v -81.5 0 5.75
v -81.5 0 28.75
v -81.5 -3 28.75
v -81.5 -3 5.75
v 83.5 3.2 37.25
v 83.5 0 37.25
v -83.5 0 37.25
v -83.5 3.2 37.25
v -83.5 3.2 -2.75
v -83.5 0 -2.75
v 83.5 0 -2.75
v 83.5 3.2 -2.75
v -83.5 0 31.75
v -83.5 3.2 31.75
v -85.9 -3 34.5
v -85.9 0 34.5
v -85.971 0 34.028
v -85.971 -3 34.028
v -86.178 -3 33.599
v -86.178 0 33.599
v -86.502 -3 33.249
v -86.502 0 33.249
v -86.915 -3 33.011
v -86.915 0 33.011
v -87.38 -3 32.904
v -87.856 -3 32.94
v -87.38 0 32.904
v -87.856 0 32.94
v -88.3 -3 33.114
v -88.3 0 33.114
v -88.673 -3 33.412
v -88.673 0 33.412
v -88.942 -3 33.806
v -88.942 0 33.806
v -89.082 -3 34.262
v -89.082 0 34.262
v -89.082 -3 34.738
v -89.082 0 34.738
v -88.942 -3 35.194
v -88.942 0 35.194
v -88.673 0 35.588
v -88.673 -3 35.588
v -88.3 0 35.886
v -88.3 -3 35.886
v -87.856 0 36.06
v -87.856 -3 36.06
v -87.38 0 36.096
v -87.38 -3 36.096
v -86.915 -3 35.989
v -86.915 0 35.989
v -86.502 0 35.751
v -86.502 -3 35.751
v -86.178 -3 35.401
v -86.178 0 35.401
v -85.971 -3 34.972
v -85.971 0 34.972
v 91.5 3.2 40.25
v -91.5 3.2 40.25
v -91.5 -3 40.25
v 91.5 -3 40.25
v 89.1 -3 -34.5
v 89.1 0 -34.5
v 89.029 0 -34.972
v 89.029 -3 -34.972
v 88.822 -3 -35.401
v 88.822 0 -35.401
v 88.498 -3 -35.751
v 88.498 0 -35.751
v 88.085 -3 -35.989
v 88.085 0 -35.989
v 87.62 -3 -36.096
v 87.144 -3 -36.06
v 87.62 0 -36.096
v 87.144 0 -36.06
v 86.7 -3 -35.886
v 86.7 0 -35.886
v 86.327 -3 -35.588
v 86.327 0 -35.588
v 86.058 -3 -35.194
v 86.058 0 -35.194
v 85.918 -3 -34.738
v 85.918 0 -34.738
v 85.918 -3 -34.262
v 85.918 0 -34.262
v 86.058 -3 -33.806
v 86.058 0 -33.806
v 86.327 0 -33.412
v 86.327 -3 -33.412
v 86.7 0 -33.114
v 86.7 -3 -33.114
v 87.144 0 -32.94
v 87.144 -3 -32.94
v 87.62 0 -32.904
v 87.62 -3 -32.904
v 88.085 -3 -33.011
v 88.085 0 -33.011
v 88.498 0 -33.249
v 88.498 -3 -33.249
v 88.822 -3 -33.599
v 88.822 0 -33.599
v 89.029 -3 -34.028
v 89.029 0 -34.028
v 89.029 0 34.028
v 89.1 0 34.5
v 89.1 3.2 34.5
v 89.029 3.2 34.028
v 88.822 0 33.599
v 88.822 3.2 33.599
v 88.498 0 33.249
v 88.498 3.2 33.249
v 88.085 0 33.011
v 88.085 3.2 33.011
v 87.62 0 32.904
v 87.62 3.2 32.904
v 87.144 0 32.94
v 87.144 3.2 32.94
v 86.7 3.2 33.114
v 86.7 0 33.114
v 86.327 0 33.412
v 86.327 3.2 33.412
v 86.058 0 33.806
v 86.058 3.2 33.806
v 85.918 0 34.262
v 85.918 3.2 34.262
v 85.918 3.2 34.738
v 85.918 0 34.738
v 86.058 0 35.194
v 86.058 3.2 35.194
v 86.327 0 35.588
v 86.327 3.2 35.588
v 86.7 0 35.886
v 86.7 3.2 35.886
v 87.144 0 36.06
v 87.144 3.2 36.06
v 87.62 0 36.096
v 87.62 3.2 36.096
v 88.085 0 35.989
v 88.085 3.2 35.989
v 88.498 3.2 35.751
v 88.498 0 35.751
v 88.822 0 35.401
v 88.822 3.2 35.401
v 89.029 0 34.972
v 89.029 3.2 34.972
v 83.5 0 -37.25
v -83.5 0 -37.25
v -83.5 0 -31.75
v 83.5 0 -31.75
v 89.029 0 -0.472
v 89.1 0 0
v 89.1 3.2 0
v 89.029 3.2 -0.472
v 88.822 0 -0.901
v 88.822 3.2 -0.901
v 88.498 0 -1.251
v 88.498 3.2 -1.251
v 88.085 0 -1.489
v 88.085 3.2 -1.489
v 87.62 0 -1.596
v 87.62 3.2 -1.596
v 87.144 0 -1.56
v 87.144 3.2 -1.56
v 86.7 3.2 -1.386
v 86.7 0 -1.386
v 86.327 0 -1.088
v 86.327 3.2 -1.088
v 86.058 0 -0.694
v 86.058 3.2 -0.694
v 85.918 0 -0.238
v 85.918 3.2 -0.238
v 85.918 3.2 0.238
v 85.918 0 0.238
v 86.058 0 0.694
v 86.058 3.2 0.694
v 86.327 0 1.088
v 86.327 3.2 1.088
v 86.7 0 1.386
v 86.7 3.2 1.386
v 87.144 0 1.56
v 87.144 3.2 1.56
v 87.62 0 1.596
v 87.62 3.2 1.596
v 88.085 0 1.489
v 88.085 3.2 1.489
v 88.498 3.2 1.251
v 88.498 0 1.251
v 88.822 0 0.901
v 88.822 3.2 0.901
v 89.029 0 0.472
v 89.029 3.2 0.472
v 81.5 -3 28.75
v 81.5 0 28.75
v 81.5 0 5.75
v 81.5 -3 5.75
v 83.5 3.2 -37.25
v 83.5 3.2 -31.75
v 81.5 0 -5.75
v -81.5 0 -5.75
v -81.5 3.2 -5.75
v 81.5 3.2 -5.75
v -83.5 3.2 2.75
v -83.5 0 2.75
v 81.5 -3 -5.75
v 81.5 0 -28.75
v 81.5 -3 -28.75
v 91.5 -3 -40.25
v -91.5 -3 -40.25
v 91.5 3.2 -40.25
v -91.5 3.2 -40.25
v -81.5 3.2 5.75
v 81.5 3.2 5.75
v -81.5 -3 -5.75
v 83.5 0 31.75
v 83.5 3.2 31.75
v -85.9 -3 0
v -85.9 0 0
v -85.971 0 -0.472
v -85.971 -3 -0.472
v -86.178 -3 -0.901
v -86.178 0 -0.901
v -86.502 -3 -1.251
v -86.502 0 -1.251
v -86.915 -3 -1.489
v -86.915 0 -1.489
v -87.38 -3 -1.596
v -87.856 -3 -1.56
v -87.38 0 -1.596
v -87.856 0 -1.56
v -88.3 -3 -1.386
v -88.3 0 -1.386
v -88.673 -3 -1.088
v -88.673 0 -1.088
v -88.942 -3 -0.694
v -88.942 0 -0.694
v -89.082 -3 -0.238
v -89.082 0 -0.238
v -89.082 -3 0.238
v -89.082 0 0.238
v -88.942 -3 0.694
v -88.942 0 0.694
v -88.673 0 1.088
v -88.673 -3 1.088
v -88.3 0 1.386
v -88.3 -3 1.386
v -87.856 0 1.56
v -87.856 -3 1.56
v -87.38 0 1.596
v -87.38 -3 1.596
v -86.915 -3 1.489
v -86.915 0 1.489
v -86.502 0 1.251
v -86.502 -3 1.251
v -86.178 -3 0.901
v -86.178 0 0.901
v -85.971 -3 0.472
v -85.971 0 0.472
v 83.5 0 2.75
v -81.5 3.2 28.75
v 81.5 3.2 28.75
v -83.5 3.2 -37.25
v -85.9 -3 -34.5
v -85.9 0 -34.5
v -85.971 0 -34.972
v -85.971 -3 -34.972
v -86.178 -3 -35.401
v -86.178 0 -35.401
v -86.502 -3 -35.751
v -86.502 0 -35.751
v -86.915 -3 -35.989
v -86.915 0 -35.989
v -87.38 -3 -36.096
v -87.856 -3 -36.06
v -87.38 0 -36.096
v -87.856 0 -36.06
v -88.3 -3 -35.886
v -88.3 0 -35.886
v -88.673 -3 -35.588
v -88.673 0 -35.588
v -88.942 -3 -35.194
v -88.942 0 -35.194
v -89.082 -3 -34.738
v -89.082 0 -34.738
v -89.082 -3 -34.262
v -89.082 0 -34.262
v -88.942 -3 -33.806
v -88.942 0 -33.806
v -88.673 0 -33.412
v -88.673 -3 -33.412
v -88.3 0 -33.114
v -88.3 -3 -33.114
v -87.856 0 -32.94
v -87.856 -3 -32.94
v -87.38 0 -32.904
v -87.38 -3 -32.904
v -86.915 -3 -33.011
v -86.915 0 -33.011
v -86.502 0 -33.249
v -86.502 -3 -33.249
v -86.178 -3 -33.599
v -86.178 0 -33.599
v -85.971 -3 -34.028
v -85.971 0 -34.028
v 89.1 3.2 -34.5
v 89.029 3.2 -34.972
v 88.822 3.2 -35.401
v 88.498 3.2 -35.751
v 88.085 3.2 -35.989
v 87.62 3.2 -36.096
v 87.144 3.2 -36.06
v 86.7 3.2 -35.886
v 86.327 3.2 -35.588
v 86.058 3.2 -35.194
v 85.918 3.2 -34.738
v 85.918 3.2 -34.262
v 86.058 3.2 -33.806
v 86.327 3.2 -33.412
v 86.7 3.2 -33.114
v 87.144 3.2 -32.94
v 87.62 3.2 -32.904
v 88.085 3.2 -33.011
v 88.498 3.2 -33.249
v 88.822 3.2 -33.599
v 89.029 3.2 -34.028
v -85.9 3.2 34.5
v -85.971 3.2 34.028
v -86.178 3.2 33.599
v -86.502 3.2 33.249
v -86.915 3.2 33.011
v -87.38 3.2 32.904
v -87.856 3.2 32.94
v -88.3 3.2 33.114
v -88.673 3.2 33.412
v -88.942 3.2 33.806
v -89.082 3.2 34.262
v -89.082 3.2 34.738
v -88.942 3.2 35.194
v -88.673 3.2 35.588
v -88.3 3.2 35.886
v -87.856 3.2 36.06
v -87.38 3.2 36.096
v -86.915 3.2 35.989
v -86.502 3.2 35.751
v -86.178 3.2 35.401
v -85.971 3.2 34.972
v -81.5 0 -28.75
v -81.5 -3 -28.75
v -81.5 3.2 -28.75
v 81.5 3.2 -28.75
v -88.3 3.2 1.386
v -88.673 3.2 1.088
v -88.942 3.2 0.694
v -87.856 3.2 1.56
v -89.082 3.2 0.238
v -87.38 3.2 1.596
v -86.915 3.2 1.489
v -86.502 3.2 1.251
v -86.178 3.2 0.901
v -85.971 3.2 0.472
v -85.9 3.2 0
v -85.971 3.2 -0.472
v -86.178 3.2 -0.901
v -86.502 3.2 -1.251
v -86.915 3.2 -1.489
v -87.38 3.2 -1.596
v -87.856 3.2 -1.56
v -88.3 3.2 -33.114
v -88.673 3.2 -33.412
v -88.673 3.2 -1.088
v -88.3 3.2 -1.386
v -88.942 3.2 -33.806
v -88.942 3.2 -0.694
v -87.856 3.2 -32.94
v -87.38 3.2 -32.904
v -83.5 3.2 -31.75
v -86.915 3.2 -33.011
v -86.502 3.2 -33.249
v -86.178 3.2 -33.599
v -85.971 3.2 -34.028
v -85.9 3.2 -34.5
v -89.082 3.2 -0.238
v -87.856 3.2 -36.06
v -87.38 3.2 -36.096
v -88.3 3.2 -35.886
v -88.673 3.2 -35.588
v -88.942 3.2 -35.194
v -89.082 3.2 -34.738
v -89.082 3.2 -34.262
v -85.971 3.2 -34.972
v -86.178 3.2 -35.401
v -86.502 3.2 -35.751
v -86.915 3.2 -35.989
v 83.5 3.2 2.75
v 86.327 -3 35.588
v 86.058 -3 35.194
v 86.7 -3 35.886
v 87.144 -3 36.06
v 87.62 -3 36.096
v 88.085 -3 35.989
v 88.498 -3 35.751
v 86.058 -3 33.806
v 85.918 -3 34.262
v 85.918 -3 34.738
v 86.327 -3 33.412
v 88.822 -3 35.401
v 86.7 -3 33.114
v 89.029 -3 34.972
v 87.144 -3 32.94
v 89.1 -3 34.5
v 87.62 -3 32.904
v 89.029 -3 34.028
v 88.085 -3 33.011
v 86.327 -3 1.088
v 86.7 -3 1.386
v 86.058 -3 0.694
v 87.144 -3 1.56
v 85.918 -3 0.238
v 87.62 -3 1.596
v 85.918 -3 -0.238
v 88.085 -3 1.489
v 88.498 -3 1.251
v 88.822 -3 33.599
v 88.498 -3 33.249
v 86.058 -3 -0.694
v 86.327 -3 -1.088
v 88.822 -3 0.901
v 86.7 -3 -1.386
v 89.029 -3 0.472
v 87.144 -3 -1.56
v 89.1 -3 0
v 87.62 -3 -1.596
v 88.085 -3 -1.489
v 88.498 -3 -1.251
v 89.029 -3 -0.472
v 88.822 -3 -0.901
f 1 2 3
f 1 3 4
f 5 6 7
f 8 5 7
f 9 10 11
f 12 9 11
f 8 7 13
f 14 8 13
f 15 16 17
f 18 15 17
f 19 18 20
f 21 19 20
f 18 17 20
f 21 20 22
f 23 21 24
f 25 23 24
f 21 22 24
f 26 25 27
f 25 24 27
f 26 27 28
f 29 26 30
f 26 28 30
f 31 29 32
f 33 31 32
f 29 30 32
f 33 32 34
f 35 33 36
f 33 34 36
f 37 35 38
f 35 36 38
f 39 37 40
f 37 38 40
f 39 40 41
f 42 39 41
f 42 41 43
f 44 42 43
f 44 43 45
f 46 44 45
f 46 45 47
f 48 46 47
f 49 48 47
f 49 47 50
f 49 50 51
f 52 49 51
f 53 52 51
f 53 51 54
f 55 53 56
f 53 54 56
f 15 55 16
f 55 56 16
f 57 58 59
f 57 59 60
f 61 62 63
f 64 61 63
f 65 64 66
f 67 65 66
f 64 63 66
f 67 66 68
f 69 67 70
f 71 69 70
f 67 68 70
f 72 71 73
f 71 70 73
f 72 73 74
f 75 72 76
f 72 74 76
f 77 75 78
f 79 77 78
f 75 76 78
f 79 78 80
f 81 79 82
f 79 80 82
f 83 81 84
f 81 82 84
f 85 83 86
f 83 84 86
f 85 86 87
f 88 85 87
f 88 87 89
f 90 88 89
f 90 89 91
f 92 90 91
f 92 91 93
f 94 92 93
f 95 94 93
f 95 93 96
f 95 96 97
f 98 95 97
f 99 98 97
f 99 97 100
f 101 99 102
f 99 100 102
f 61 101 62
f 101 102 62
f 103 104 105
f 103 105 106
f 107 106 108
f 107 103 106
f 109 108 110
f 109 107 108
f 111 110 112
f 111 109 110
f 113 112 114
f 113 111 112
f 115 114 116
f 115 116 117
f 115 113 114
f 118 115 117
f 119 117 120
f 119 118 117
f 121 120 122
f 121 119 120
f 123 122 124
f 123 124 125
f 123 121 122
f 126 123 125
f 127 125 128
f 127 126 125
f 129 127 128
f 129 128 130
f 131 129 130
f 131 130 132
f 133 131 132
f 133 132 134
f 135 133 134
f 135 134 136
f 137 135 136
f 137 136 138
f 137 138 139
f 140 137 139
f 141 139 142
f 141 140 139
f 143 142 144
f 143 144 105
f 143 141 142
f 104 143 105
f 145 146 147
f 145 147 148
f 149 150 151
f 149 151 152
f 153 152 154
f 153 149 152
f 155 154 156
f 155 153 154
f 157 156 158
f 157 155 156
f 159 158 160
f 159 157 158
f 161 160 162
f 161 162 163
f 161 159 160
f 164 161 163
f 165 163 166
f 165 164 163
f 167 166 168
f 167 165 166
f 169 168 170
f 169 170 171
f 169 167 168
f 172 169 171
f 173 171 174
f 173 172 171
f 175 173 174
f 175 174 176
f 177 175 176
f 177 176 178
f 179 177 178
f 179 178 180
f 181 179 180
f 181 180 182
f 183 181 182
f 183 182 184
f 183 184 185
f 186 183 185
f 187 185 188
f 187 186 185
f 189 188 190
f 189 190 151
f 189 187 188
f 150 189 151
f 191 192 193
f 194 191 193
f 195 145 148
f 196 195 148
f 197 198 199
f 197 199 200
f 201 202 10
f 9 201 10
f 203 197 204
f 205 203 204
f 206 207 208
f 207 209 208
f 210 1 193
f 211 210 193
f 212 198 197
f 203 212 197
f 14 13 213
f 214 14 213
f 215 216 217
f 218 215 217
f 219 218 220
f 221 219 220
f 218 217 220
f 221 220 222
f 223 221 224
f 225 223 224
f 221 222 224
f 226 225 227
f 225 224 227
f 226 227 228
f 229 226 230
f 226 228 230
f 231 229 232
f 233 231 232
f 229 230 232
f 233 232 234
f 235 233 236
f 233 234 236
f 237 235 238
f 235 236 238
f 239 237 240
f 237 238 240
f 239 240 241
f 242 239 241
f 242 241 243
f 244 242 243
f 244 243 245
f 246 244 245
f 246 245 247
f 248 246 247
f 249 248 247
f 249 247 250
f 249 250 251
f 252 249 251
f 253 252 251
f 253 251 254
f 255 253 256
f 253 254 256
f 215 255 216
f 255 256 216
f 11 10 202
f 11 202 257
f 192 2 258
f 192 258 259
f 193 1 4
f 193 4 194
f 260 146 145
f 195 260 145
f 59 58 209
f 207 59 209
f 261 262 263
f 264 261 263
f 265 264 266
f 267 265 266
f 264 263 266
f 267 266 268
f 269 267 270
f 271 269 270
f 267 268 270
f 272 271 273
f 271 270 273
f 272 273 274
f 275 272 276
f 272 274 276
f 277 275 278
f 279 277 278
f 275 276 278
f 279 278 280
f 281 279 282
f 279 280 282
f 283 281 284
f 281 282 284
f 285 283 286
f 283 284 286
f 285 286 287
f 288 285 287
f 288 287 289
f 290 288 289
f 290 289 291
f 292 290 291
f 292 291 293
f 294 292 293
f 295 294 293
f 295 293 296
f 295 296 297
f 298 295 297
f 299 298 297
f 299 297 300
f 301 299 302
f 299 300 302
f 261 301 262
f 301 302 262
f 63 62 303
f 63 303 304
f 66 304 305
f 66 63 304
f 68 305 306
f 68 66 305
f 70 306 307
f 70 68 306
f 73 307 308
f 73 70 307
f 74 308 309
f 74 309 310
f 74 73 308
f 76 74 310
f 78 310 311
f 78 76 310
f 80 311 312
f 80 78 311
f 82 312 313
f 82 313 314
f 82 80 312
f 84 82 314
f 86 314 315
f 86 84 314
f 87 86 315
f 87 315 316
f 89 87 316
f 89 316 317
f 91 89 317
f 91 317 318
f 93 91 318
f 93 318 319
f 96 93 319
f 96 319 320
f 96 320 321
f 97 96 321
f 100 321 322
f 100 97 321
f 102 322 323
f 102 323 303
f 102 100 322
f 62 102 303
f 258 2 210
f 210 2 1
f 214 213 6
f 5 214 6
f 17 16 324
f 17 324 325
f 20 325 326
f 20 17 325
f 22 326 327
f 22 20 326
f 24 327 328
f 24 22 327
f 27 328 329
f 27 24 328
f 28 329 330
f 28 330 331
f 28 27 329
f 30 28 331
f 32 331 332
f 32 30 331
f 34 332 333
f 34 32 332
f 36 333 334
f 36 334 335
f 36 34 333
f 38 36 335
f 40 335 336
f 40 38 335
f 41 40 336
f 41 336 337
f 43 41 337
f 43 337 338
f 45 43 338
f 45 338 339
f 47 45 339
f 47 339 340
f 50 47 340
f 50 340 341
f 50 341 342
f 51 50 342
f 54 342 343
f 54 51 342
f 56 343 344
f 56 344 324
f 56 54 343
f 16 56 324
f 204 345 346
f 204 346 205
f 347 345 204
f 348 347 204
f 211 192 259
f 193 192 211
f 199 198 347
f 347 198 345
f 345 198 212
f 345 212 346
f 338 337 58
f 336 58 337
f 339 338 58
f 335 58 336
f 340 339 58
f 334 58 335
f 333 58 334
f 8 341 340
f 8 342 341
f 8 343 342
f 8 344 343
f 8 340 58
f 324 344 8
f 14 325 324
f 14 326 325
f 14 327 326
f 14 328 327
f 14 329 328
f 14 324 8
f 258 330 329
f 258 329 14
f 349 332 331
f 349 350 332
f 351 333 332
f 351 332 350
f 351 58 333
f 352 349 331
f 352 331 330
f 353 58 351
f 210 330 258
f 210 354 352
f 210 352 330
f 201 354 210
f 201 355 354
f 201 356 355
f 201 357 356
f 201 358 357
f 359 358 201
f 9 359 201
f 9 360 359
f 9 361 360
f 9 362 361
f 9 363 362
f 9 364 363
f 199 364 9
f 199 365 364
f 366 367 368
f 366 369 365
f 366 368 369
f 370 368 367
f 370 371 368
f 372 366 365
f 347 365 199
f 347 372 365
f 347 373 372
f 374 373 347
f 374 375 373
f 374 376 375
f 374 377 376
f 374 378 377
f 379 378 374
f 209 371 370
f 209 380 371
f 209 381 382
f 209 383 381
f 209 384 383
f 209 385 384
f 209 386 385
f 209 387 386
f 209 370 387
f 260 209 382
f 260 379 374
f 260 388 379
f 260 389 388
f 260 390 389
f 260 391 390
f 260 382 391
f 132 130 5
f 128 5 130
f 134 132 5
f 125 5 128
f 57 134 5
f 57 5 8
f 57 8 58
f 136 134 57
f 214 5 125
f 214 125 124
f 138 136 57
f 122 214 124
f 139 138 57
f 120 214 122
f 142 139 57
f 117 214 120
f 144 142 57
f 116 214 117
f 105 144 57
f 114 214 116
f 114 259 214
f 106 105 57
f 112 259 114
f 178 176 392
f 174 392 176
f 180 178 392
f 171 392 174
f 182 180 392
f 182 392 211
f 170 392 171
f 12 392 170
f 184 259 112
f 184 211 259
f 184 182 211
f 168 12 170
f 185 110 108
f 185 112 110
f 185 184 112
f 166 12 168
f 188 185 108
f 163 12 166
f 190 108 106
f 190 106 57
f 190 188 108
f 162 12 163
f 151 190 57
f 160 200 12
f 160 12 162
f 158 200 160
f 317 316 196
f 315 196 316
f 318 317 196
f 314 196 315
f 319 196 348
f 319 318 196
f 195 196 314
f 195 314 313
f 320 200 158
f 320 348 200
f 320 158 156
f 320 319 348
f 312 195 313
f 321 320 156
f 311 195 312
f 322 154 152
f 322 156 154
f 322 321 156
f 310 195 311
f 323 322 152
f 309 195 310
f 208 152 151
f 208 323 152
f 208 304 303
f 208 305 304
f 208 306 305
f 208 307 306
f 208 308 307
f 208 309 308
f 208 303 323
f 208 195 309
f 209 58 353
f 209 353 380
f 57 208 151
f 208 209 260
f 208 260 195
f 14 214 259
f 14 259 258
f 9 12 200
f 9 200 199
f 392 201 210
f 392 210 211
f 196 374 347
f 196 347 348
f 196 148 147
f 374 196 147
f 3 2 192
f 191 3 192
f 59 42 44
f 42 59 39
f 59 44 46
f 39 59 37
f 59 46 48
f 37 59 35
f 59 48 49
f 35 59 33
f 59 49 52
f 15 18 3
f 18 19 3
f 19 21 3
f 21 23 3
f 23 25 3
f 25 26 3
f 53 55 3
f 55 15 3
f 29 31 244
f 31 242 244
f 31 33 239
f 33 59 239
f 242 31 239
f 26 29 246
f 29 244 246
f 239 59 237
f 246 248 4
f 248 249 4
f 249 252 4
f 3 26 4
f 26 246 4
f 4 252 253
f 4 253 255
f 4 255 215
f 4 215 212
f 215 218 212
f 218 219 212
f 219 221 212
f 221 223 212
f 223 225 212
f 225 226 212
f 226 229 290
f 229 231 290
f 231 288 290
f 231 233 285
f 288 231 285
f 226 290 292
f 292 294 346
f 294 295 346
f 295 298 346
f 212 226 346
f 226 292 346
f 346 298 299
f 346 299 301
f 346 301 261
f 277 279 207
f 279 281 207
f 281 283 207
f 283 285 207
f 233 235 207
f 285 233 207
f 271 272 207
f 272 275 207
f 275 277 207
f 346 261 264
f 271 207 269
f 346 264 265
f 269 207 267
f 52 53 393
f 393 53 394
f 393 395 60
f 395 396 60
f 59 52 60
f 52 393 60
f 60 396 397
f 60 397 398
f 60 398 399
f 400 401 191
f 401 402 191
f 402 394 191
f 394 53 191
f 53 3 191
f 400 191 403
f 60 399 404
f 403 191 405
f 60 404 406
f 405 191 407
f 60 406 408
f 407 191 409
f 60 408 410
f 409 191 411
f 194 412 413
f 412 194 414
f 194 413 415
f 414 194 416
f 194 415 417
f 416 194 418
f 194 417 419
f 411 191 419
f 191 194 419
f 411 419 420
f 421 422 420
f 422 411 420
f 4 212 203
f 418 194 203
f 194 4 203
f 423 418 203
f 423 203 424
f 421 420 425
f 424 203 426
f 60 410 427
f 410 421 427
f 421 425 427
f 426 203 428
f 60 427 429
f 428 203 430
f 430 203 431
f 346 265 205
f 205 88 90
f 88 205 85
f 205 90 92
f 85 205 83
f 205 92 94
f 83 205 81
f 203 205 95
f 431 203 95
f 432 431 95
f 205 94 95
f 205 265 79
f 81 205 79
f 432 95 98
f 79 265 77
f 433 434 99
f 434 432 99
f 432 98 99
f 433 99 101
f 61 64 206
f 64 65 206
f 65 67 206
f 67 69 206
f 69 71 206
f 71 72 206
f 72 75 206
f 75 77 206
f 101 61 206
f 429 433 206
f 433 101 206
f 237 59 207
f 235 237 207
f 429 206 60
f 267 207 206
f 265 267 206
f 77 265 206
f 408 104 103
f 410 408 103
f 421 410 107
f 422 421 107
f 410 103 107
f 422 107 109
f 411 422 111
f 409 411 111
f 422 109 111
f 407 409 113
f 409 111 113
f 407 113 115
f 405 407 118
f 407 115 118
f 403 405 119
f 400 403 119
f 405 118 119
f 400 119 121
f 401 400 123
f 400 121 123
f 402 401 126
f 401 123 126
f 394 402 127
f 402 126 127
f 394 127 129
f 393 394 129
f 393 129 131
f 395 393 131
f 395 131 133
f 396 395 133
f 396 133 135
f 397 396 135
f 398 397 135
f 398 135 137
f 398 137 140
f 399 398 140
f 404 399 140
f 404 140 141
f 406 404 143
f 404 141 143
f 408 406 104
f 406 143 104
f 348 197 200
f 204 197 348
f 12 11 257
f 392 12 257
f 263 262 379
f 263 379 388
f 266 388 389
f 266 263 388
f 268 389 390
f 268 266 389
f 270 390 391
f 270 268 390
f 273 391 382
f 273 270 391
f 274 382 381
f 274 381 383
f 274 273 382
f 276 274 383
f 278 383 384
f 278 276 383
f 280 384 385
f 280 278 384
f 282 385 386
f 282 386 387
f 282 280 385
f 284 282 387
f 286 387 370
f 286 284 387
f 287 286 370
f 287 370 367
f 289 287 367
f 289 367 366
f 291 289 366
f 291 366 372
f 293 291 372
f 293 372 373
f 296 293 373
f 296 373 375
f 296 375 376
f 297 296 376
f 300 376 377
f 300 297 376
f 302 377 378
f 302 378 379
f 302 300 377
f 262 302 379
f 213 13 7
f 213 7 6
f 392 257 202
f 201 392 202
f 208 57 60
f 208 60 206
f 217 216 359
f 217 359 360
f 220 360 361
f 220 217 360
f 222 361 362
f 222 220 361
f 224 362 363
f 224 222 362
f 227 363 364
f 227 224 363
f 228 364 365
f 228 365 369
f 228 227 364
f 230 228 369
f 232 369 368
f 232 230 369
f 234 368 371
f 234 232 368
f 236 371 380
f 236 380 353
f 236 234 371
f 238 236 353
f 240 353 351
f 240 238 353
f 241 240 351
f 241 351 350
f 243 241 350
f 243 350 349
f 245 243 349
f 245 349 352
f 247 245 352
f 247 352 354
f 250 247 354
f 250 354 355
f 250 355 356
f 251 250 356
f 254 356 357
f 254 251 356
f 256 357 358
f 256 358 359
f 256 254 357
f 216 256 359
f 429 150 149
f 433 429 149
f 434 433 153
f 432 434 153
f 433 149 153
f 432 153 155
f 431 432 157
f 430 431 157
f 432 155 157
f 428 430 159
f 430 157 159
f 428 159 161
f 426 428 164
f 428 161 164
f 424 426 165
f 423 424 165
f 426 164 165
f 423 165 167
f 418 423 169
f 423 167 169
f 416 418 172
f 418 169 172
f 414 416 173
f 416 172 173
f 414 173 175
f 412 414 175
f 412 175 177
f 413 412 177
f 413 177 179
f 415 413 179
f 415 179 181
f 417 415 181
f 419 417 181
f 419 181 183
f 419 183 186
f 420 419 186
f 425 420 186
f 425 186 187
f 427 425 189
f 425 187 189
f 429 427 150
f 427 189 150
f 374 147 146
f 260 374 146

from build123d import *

# Parameters (mm, degrees)
SKETCH1_W           = 183
SKETCH1_H           = 80.5
SKETCH1_W_2         = 163
SKETCH1_H_2         = 23
SKETCH1_R           = 1.6
BOSS_EXTRUDE1_DEPTH = 3.2
SKETCH1_3_W         = 183
SKETCH1_3_H         = 80.5
SKETCH1_3_R         = 1.6
SKETCH1_3_W_2       = 163
SKETCH1_3_H_2       = 23
BOSS_EXTRUDE2_DEPTH = 3


with BuildPart() as part:
    # Sketch1 → Boss-Extrude1 (new body)
    with BuildSketch(Plane(origin=(0, 0, 0), x_dir=(1, 0, 0), z_dir=(0, 1, 0))):
        Rectangle(SKETCH1_W, SKETCH1_H)
        with Locations((0, 17.25)):
            Rectangle(SKETCH1_W_2, SKETCH1_H_2, mode=Mode.SUBTRACT)
        Polygon((83.5, 2.75), (83.5, -2.75), (81.5, -2.75), (-81.5, -2.75), (-83.5, -2.75), (-83.5, 2.75), align=None, mode=Mode.SUBTRACT)
        with Locations((0, -17.25)):
            Rectangle(SKETCH1_W_2, SKETCH1_H_2, mode=Mode.SUBTRACT)
        Polygon((83.5, -31.75), (83.5, -37.25), (-81.5, -37.25), (-83.5, -37.25), (-83.5, -31.75), align=None, mode=Mode.SUBTRACT)
        Polygon((81.5, 37.25), (83.5, 37.25), (83.5, 31.75), (-83.5, 31.75), (-83.5, 37.25), align=None, mode=Mode.SUBTRACT)
        with Locations((-87.5, -34.5)):
            Circle(SKETCH1_R, mode=Mode.SUBTRACT)
        with Locations((-87.5, 0)):
            Circle(SKETCH1_R, mode=Mode.SUBTRACT)
        with Locations((-87.5, 34.5)):
            Circle(SKETCH1_R, mode=Mode.SUBTRACT)
        with Locations((87.5, 34.5)):
            Circle(SKETCH1_R, mode=Mode.SUBTRACT)
        with Locations((87.5, -34.5)):
            Circle(SKETCH1_R, mode=Mode.SUBTRACT)
        with Locations((87.5, 0)):
            Circle(SKETCH1_R, mode=Mode.SUBTRACT)
    extrude(amount=BOSS_EXTRUDE1_DEPTH)

    # Sketch1<3> → Boss-Extrude2 (add)
    with BuildSketch(Plane(origin=(0, 0, 0), x_dir=(1, 0, 0), z_dir=(0, 1, 0))):
        Rectangle(SKETCH1_3_W, SKETCH1_3_H)
        with Locations((-87.5, -34.5)):
            Circle(SKETCH1_3_R, mode=Mode.SUBTRACT)
        with Locations((0, -17.25)):
            Rectangle(SKETCH1_3_W_2, SKETCH1_3_H_2, mode=Mode.SUBTRACT)
        with Locations((87.5, -34.5)):
            Circle(SKETCH1_3_R, mode=Mode.SUBTRACT)
        with Locations((-87.5, 0)):
            Circle(SKETCH1_3_R, mode=Mode.SUBTRACT)
        with Locations((0, 17.25)):
            Rectangle(SKETCH1_3_W_2, SKETCH1_3_H_2, mode=Mode.SUBTRACT)
        with Locations((-87.5, 34.5)):
            Circle(SKETCH1_3_R, mode=Mode.SUBTRACT)
        with Locations((87.5, 0)):
            Circle(SKETCH1_3_R, mode=Mode.SUBTRACT)
        with Locations((87.5, 34.5)):
            Circle(SKETCH1_3_R, mode=Mode.SUBTRACT)
    extrude(amount=-BOSS_EXTRUDE2_DEPTH)


solid = part.part
